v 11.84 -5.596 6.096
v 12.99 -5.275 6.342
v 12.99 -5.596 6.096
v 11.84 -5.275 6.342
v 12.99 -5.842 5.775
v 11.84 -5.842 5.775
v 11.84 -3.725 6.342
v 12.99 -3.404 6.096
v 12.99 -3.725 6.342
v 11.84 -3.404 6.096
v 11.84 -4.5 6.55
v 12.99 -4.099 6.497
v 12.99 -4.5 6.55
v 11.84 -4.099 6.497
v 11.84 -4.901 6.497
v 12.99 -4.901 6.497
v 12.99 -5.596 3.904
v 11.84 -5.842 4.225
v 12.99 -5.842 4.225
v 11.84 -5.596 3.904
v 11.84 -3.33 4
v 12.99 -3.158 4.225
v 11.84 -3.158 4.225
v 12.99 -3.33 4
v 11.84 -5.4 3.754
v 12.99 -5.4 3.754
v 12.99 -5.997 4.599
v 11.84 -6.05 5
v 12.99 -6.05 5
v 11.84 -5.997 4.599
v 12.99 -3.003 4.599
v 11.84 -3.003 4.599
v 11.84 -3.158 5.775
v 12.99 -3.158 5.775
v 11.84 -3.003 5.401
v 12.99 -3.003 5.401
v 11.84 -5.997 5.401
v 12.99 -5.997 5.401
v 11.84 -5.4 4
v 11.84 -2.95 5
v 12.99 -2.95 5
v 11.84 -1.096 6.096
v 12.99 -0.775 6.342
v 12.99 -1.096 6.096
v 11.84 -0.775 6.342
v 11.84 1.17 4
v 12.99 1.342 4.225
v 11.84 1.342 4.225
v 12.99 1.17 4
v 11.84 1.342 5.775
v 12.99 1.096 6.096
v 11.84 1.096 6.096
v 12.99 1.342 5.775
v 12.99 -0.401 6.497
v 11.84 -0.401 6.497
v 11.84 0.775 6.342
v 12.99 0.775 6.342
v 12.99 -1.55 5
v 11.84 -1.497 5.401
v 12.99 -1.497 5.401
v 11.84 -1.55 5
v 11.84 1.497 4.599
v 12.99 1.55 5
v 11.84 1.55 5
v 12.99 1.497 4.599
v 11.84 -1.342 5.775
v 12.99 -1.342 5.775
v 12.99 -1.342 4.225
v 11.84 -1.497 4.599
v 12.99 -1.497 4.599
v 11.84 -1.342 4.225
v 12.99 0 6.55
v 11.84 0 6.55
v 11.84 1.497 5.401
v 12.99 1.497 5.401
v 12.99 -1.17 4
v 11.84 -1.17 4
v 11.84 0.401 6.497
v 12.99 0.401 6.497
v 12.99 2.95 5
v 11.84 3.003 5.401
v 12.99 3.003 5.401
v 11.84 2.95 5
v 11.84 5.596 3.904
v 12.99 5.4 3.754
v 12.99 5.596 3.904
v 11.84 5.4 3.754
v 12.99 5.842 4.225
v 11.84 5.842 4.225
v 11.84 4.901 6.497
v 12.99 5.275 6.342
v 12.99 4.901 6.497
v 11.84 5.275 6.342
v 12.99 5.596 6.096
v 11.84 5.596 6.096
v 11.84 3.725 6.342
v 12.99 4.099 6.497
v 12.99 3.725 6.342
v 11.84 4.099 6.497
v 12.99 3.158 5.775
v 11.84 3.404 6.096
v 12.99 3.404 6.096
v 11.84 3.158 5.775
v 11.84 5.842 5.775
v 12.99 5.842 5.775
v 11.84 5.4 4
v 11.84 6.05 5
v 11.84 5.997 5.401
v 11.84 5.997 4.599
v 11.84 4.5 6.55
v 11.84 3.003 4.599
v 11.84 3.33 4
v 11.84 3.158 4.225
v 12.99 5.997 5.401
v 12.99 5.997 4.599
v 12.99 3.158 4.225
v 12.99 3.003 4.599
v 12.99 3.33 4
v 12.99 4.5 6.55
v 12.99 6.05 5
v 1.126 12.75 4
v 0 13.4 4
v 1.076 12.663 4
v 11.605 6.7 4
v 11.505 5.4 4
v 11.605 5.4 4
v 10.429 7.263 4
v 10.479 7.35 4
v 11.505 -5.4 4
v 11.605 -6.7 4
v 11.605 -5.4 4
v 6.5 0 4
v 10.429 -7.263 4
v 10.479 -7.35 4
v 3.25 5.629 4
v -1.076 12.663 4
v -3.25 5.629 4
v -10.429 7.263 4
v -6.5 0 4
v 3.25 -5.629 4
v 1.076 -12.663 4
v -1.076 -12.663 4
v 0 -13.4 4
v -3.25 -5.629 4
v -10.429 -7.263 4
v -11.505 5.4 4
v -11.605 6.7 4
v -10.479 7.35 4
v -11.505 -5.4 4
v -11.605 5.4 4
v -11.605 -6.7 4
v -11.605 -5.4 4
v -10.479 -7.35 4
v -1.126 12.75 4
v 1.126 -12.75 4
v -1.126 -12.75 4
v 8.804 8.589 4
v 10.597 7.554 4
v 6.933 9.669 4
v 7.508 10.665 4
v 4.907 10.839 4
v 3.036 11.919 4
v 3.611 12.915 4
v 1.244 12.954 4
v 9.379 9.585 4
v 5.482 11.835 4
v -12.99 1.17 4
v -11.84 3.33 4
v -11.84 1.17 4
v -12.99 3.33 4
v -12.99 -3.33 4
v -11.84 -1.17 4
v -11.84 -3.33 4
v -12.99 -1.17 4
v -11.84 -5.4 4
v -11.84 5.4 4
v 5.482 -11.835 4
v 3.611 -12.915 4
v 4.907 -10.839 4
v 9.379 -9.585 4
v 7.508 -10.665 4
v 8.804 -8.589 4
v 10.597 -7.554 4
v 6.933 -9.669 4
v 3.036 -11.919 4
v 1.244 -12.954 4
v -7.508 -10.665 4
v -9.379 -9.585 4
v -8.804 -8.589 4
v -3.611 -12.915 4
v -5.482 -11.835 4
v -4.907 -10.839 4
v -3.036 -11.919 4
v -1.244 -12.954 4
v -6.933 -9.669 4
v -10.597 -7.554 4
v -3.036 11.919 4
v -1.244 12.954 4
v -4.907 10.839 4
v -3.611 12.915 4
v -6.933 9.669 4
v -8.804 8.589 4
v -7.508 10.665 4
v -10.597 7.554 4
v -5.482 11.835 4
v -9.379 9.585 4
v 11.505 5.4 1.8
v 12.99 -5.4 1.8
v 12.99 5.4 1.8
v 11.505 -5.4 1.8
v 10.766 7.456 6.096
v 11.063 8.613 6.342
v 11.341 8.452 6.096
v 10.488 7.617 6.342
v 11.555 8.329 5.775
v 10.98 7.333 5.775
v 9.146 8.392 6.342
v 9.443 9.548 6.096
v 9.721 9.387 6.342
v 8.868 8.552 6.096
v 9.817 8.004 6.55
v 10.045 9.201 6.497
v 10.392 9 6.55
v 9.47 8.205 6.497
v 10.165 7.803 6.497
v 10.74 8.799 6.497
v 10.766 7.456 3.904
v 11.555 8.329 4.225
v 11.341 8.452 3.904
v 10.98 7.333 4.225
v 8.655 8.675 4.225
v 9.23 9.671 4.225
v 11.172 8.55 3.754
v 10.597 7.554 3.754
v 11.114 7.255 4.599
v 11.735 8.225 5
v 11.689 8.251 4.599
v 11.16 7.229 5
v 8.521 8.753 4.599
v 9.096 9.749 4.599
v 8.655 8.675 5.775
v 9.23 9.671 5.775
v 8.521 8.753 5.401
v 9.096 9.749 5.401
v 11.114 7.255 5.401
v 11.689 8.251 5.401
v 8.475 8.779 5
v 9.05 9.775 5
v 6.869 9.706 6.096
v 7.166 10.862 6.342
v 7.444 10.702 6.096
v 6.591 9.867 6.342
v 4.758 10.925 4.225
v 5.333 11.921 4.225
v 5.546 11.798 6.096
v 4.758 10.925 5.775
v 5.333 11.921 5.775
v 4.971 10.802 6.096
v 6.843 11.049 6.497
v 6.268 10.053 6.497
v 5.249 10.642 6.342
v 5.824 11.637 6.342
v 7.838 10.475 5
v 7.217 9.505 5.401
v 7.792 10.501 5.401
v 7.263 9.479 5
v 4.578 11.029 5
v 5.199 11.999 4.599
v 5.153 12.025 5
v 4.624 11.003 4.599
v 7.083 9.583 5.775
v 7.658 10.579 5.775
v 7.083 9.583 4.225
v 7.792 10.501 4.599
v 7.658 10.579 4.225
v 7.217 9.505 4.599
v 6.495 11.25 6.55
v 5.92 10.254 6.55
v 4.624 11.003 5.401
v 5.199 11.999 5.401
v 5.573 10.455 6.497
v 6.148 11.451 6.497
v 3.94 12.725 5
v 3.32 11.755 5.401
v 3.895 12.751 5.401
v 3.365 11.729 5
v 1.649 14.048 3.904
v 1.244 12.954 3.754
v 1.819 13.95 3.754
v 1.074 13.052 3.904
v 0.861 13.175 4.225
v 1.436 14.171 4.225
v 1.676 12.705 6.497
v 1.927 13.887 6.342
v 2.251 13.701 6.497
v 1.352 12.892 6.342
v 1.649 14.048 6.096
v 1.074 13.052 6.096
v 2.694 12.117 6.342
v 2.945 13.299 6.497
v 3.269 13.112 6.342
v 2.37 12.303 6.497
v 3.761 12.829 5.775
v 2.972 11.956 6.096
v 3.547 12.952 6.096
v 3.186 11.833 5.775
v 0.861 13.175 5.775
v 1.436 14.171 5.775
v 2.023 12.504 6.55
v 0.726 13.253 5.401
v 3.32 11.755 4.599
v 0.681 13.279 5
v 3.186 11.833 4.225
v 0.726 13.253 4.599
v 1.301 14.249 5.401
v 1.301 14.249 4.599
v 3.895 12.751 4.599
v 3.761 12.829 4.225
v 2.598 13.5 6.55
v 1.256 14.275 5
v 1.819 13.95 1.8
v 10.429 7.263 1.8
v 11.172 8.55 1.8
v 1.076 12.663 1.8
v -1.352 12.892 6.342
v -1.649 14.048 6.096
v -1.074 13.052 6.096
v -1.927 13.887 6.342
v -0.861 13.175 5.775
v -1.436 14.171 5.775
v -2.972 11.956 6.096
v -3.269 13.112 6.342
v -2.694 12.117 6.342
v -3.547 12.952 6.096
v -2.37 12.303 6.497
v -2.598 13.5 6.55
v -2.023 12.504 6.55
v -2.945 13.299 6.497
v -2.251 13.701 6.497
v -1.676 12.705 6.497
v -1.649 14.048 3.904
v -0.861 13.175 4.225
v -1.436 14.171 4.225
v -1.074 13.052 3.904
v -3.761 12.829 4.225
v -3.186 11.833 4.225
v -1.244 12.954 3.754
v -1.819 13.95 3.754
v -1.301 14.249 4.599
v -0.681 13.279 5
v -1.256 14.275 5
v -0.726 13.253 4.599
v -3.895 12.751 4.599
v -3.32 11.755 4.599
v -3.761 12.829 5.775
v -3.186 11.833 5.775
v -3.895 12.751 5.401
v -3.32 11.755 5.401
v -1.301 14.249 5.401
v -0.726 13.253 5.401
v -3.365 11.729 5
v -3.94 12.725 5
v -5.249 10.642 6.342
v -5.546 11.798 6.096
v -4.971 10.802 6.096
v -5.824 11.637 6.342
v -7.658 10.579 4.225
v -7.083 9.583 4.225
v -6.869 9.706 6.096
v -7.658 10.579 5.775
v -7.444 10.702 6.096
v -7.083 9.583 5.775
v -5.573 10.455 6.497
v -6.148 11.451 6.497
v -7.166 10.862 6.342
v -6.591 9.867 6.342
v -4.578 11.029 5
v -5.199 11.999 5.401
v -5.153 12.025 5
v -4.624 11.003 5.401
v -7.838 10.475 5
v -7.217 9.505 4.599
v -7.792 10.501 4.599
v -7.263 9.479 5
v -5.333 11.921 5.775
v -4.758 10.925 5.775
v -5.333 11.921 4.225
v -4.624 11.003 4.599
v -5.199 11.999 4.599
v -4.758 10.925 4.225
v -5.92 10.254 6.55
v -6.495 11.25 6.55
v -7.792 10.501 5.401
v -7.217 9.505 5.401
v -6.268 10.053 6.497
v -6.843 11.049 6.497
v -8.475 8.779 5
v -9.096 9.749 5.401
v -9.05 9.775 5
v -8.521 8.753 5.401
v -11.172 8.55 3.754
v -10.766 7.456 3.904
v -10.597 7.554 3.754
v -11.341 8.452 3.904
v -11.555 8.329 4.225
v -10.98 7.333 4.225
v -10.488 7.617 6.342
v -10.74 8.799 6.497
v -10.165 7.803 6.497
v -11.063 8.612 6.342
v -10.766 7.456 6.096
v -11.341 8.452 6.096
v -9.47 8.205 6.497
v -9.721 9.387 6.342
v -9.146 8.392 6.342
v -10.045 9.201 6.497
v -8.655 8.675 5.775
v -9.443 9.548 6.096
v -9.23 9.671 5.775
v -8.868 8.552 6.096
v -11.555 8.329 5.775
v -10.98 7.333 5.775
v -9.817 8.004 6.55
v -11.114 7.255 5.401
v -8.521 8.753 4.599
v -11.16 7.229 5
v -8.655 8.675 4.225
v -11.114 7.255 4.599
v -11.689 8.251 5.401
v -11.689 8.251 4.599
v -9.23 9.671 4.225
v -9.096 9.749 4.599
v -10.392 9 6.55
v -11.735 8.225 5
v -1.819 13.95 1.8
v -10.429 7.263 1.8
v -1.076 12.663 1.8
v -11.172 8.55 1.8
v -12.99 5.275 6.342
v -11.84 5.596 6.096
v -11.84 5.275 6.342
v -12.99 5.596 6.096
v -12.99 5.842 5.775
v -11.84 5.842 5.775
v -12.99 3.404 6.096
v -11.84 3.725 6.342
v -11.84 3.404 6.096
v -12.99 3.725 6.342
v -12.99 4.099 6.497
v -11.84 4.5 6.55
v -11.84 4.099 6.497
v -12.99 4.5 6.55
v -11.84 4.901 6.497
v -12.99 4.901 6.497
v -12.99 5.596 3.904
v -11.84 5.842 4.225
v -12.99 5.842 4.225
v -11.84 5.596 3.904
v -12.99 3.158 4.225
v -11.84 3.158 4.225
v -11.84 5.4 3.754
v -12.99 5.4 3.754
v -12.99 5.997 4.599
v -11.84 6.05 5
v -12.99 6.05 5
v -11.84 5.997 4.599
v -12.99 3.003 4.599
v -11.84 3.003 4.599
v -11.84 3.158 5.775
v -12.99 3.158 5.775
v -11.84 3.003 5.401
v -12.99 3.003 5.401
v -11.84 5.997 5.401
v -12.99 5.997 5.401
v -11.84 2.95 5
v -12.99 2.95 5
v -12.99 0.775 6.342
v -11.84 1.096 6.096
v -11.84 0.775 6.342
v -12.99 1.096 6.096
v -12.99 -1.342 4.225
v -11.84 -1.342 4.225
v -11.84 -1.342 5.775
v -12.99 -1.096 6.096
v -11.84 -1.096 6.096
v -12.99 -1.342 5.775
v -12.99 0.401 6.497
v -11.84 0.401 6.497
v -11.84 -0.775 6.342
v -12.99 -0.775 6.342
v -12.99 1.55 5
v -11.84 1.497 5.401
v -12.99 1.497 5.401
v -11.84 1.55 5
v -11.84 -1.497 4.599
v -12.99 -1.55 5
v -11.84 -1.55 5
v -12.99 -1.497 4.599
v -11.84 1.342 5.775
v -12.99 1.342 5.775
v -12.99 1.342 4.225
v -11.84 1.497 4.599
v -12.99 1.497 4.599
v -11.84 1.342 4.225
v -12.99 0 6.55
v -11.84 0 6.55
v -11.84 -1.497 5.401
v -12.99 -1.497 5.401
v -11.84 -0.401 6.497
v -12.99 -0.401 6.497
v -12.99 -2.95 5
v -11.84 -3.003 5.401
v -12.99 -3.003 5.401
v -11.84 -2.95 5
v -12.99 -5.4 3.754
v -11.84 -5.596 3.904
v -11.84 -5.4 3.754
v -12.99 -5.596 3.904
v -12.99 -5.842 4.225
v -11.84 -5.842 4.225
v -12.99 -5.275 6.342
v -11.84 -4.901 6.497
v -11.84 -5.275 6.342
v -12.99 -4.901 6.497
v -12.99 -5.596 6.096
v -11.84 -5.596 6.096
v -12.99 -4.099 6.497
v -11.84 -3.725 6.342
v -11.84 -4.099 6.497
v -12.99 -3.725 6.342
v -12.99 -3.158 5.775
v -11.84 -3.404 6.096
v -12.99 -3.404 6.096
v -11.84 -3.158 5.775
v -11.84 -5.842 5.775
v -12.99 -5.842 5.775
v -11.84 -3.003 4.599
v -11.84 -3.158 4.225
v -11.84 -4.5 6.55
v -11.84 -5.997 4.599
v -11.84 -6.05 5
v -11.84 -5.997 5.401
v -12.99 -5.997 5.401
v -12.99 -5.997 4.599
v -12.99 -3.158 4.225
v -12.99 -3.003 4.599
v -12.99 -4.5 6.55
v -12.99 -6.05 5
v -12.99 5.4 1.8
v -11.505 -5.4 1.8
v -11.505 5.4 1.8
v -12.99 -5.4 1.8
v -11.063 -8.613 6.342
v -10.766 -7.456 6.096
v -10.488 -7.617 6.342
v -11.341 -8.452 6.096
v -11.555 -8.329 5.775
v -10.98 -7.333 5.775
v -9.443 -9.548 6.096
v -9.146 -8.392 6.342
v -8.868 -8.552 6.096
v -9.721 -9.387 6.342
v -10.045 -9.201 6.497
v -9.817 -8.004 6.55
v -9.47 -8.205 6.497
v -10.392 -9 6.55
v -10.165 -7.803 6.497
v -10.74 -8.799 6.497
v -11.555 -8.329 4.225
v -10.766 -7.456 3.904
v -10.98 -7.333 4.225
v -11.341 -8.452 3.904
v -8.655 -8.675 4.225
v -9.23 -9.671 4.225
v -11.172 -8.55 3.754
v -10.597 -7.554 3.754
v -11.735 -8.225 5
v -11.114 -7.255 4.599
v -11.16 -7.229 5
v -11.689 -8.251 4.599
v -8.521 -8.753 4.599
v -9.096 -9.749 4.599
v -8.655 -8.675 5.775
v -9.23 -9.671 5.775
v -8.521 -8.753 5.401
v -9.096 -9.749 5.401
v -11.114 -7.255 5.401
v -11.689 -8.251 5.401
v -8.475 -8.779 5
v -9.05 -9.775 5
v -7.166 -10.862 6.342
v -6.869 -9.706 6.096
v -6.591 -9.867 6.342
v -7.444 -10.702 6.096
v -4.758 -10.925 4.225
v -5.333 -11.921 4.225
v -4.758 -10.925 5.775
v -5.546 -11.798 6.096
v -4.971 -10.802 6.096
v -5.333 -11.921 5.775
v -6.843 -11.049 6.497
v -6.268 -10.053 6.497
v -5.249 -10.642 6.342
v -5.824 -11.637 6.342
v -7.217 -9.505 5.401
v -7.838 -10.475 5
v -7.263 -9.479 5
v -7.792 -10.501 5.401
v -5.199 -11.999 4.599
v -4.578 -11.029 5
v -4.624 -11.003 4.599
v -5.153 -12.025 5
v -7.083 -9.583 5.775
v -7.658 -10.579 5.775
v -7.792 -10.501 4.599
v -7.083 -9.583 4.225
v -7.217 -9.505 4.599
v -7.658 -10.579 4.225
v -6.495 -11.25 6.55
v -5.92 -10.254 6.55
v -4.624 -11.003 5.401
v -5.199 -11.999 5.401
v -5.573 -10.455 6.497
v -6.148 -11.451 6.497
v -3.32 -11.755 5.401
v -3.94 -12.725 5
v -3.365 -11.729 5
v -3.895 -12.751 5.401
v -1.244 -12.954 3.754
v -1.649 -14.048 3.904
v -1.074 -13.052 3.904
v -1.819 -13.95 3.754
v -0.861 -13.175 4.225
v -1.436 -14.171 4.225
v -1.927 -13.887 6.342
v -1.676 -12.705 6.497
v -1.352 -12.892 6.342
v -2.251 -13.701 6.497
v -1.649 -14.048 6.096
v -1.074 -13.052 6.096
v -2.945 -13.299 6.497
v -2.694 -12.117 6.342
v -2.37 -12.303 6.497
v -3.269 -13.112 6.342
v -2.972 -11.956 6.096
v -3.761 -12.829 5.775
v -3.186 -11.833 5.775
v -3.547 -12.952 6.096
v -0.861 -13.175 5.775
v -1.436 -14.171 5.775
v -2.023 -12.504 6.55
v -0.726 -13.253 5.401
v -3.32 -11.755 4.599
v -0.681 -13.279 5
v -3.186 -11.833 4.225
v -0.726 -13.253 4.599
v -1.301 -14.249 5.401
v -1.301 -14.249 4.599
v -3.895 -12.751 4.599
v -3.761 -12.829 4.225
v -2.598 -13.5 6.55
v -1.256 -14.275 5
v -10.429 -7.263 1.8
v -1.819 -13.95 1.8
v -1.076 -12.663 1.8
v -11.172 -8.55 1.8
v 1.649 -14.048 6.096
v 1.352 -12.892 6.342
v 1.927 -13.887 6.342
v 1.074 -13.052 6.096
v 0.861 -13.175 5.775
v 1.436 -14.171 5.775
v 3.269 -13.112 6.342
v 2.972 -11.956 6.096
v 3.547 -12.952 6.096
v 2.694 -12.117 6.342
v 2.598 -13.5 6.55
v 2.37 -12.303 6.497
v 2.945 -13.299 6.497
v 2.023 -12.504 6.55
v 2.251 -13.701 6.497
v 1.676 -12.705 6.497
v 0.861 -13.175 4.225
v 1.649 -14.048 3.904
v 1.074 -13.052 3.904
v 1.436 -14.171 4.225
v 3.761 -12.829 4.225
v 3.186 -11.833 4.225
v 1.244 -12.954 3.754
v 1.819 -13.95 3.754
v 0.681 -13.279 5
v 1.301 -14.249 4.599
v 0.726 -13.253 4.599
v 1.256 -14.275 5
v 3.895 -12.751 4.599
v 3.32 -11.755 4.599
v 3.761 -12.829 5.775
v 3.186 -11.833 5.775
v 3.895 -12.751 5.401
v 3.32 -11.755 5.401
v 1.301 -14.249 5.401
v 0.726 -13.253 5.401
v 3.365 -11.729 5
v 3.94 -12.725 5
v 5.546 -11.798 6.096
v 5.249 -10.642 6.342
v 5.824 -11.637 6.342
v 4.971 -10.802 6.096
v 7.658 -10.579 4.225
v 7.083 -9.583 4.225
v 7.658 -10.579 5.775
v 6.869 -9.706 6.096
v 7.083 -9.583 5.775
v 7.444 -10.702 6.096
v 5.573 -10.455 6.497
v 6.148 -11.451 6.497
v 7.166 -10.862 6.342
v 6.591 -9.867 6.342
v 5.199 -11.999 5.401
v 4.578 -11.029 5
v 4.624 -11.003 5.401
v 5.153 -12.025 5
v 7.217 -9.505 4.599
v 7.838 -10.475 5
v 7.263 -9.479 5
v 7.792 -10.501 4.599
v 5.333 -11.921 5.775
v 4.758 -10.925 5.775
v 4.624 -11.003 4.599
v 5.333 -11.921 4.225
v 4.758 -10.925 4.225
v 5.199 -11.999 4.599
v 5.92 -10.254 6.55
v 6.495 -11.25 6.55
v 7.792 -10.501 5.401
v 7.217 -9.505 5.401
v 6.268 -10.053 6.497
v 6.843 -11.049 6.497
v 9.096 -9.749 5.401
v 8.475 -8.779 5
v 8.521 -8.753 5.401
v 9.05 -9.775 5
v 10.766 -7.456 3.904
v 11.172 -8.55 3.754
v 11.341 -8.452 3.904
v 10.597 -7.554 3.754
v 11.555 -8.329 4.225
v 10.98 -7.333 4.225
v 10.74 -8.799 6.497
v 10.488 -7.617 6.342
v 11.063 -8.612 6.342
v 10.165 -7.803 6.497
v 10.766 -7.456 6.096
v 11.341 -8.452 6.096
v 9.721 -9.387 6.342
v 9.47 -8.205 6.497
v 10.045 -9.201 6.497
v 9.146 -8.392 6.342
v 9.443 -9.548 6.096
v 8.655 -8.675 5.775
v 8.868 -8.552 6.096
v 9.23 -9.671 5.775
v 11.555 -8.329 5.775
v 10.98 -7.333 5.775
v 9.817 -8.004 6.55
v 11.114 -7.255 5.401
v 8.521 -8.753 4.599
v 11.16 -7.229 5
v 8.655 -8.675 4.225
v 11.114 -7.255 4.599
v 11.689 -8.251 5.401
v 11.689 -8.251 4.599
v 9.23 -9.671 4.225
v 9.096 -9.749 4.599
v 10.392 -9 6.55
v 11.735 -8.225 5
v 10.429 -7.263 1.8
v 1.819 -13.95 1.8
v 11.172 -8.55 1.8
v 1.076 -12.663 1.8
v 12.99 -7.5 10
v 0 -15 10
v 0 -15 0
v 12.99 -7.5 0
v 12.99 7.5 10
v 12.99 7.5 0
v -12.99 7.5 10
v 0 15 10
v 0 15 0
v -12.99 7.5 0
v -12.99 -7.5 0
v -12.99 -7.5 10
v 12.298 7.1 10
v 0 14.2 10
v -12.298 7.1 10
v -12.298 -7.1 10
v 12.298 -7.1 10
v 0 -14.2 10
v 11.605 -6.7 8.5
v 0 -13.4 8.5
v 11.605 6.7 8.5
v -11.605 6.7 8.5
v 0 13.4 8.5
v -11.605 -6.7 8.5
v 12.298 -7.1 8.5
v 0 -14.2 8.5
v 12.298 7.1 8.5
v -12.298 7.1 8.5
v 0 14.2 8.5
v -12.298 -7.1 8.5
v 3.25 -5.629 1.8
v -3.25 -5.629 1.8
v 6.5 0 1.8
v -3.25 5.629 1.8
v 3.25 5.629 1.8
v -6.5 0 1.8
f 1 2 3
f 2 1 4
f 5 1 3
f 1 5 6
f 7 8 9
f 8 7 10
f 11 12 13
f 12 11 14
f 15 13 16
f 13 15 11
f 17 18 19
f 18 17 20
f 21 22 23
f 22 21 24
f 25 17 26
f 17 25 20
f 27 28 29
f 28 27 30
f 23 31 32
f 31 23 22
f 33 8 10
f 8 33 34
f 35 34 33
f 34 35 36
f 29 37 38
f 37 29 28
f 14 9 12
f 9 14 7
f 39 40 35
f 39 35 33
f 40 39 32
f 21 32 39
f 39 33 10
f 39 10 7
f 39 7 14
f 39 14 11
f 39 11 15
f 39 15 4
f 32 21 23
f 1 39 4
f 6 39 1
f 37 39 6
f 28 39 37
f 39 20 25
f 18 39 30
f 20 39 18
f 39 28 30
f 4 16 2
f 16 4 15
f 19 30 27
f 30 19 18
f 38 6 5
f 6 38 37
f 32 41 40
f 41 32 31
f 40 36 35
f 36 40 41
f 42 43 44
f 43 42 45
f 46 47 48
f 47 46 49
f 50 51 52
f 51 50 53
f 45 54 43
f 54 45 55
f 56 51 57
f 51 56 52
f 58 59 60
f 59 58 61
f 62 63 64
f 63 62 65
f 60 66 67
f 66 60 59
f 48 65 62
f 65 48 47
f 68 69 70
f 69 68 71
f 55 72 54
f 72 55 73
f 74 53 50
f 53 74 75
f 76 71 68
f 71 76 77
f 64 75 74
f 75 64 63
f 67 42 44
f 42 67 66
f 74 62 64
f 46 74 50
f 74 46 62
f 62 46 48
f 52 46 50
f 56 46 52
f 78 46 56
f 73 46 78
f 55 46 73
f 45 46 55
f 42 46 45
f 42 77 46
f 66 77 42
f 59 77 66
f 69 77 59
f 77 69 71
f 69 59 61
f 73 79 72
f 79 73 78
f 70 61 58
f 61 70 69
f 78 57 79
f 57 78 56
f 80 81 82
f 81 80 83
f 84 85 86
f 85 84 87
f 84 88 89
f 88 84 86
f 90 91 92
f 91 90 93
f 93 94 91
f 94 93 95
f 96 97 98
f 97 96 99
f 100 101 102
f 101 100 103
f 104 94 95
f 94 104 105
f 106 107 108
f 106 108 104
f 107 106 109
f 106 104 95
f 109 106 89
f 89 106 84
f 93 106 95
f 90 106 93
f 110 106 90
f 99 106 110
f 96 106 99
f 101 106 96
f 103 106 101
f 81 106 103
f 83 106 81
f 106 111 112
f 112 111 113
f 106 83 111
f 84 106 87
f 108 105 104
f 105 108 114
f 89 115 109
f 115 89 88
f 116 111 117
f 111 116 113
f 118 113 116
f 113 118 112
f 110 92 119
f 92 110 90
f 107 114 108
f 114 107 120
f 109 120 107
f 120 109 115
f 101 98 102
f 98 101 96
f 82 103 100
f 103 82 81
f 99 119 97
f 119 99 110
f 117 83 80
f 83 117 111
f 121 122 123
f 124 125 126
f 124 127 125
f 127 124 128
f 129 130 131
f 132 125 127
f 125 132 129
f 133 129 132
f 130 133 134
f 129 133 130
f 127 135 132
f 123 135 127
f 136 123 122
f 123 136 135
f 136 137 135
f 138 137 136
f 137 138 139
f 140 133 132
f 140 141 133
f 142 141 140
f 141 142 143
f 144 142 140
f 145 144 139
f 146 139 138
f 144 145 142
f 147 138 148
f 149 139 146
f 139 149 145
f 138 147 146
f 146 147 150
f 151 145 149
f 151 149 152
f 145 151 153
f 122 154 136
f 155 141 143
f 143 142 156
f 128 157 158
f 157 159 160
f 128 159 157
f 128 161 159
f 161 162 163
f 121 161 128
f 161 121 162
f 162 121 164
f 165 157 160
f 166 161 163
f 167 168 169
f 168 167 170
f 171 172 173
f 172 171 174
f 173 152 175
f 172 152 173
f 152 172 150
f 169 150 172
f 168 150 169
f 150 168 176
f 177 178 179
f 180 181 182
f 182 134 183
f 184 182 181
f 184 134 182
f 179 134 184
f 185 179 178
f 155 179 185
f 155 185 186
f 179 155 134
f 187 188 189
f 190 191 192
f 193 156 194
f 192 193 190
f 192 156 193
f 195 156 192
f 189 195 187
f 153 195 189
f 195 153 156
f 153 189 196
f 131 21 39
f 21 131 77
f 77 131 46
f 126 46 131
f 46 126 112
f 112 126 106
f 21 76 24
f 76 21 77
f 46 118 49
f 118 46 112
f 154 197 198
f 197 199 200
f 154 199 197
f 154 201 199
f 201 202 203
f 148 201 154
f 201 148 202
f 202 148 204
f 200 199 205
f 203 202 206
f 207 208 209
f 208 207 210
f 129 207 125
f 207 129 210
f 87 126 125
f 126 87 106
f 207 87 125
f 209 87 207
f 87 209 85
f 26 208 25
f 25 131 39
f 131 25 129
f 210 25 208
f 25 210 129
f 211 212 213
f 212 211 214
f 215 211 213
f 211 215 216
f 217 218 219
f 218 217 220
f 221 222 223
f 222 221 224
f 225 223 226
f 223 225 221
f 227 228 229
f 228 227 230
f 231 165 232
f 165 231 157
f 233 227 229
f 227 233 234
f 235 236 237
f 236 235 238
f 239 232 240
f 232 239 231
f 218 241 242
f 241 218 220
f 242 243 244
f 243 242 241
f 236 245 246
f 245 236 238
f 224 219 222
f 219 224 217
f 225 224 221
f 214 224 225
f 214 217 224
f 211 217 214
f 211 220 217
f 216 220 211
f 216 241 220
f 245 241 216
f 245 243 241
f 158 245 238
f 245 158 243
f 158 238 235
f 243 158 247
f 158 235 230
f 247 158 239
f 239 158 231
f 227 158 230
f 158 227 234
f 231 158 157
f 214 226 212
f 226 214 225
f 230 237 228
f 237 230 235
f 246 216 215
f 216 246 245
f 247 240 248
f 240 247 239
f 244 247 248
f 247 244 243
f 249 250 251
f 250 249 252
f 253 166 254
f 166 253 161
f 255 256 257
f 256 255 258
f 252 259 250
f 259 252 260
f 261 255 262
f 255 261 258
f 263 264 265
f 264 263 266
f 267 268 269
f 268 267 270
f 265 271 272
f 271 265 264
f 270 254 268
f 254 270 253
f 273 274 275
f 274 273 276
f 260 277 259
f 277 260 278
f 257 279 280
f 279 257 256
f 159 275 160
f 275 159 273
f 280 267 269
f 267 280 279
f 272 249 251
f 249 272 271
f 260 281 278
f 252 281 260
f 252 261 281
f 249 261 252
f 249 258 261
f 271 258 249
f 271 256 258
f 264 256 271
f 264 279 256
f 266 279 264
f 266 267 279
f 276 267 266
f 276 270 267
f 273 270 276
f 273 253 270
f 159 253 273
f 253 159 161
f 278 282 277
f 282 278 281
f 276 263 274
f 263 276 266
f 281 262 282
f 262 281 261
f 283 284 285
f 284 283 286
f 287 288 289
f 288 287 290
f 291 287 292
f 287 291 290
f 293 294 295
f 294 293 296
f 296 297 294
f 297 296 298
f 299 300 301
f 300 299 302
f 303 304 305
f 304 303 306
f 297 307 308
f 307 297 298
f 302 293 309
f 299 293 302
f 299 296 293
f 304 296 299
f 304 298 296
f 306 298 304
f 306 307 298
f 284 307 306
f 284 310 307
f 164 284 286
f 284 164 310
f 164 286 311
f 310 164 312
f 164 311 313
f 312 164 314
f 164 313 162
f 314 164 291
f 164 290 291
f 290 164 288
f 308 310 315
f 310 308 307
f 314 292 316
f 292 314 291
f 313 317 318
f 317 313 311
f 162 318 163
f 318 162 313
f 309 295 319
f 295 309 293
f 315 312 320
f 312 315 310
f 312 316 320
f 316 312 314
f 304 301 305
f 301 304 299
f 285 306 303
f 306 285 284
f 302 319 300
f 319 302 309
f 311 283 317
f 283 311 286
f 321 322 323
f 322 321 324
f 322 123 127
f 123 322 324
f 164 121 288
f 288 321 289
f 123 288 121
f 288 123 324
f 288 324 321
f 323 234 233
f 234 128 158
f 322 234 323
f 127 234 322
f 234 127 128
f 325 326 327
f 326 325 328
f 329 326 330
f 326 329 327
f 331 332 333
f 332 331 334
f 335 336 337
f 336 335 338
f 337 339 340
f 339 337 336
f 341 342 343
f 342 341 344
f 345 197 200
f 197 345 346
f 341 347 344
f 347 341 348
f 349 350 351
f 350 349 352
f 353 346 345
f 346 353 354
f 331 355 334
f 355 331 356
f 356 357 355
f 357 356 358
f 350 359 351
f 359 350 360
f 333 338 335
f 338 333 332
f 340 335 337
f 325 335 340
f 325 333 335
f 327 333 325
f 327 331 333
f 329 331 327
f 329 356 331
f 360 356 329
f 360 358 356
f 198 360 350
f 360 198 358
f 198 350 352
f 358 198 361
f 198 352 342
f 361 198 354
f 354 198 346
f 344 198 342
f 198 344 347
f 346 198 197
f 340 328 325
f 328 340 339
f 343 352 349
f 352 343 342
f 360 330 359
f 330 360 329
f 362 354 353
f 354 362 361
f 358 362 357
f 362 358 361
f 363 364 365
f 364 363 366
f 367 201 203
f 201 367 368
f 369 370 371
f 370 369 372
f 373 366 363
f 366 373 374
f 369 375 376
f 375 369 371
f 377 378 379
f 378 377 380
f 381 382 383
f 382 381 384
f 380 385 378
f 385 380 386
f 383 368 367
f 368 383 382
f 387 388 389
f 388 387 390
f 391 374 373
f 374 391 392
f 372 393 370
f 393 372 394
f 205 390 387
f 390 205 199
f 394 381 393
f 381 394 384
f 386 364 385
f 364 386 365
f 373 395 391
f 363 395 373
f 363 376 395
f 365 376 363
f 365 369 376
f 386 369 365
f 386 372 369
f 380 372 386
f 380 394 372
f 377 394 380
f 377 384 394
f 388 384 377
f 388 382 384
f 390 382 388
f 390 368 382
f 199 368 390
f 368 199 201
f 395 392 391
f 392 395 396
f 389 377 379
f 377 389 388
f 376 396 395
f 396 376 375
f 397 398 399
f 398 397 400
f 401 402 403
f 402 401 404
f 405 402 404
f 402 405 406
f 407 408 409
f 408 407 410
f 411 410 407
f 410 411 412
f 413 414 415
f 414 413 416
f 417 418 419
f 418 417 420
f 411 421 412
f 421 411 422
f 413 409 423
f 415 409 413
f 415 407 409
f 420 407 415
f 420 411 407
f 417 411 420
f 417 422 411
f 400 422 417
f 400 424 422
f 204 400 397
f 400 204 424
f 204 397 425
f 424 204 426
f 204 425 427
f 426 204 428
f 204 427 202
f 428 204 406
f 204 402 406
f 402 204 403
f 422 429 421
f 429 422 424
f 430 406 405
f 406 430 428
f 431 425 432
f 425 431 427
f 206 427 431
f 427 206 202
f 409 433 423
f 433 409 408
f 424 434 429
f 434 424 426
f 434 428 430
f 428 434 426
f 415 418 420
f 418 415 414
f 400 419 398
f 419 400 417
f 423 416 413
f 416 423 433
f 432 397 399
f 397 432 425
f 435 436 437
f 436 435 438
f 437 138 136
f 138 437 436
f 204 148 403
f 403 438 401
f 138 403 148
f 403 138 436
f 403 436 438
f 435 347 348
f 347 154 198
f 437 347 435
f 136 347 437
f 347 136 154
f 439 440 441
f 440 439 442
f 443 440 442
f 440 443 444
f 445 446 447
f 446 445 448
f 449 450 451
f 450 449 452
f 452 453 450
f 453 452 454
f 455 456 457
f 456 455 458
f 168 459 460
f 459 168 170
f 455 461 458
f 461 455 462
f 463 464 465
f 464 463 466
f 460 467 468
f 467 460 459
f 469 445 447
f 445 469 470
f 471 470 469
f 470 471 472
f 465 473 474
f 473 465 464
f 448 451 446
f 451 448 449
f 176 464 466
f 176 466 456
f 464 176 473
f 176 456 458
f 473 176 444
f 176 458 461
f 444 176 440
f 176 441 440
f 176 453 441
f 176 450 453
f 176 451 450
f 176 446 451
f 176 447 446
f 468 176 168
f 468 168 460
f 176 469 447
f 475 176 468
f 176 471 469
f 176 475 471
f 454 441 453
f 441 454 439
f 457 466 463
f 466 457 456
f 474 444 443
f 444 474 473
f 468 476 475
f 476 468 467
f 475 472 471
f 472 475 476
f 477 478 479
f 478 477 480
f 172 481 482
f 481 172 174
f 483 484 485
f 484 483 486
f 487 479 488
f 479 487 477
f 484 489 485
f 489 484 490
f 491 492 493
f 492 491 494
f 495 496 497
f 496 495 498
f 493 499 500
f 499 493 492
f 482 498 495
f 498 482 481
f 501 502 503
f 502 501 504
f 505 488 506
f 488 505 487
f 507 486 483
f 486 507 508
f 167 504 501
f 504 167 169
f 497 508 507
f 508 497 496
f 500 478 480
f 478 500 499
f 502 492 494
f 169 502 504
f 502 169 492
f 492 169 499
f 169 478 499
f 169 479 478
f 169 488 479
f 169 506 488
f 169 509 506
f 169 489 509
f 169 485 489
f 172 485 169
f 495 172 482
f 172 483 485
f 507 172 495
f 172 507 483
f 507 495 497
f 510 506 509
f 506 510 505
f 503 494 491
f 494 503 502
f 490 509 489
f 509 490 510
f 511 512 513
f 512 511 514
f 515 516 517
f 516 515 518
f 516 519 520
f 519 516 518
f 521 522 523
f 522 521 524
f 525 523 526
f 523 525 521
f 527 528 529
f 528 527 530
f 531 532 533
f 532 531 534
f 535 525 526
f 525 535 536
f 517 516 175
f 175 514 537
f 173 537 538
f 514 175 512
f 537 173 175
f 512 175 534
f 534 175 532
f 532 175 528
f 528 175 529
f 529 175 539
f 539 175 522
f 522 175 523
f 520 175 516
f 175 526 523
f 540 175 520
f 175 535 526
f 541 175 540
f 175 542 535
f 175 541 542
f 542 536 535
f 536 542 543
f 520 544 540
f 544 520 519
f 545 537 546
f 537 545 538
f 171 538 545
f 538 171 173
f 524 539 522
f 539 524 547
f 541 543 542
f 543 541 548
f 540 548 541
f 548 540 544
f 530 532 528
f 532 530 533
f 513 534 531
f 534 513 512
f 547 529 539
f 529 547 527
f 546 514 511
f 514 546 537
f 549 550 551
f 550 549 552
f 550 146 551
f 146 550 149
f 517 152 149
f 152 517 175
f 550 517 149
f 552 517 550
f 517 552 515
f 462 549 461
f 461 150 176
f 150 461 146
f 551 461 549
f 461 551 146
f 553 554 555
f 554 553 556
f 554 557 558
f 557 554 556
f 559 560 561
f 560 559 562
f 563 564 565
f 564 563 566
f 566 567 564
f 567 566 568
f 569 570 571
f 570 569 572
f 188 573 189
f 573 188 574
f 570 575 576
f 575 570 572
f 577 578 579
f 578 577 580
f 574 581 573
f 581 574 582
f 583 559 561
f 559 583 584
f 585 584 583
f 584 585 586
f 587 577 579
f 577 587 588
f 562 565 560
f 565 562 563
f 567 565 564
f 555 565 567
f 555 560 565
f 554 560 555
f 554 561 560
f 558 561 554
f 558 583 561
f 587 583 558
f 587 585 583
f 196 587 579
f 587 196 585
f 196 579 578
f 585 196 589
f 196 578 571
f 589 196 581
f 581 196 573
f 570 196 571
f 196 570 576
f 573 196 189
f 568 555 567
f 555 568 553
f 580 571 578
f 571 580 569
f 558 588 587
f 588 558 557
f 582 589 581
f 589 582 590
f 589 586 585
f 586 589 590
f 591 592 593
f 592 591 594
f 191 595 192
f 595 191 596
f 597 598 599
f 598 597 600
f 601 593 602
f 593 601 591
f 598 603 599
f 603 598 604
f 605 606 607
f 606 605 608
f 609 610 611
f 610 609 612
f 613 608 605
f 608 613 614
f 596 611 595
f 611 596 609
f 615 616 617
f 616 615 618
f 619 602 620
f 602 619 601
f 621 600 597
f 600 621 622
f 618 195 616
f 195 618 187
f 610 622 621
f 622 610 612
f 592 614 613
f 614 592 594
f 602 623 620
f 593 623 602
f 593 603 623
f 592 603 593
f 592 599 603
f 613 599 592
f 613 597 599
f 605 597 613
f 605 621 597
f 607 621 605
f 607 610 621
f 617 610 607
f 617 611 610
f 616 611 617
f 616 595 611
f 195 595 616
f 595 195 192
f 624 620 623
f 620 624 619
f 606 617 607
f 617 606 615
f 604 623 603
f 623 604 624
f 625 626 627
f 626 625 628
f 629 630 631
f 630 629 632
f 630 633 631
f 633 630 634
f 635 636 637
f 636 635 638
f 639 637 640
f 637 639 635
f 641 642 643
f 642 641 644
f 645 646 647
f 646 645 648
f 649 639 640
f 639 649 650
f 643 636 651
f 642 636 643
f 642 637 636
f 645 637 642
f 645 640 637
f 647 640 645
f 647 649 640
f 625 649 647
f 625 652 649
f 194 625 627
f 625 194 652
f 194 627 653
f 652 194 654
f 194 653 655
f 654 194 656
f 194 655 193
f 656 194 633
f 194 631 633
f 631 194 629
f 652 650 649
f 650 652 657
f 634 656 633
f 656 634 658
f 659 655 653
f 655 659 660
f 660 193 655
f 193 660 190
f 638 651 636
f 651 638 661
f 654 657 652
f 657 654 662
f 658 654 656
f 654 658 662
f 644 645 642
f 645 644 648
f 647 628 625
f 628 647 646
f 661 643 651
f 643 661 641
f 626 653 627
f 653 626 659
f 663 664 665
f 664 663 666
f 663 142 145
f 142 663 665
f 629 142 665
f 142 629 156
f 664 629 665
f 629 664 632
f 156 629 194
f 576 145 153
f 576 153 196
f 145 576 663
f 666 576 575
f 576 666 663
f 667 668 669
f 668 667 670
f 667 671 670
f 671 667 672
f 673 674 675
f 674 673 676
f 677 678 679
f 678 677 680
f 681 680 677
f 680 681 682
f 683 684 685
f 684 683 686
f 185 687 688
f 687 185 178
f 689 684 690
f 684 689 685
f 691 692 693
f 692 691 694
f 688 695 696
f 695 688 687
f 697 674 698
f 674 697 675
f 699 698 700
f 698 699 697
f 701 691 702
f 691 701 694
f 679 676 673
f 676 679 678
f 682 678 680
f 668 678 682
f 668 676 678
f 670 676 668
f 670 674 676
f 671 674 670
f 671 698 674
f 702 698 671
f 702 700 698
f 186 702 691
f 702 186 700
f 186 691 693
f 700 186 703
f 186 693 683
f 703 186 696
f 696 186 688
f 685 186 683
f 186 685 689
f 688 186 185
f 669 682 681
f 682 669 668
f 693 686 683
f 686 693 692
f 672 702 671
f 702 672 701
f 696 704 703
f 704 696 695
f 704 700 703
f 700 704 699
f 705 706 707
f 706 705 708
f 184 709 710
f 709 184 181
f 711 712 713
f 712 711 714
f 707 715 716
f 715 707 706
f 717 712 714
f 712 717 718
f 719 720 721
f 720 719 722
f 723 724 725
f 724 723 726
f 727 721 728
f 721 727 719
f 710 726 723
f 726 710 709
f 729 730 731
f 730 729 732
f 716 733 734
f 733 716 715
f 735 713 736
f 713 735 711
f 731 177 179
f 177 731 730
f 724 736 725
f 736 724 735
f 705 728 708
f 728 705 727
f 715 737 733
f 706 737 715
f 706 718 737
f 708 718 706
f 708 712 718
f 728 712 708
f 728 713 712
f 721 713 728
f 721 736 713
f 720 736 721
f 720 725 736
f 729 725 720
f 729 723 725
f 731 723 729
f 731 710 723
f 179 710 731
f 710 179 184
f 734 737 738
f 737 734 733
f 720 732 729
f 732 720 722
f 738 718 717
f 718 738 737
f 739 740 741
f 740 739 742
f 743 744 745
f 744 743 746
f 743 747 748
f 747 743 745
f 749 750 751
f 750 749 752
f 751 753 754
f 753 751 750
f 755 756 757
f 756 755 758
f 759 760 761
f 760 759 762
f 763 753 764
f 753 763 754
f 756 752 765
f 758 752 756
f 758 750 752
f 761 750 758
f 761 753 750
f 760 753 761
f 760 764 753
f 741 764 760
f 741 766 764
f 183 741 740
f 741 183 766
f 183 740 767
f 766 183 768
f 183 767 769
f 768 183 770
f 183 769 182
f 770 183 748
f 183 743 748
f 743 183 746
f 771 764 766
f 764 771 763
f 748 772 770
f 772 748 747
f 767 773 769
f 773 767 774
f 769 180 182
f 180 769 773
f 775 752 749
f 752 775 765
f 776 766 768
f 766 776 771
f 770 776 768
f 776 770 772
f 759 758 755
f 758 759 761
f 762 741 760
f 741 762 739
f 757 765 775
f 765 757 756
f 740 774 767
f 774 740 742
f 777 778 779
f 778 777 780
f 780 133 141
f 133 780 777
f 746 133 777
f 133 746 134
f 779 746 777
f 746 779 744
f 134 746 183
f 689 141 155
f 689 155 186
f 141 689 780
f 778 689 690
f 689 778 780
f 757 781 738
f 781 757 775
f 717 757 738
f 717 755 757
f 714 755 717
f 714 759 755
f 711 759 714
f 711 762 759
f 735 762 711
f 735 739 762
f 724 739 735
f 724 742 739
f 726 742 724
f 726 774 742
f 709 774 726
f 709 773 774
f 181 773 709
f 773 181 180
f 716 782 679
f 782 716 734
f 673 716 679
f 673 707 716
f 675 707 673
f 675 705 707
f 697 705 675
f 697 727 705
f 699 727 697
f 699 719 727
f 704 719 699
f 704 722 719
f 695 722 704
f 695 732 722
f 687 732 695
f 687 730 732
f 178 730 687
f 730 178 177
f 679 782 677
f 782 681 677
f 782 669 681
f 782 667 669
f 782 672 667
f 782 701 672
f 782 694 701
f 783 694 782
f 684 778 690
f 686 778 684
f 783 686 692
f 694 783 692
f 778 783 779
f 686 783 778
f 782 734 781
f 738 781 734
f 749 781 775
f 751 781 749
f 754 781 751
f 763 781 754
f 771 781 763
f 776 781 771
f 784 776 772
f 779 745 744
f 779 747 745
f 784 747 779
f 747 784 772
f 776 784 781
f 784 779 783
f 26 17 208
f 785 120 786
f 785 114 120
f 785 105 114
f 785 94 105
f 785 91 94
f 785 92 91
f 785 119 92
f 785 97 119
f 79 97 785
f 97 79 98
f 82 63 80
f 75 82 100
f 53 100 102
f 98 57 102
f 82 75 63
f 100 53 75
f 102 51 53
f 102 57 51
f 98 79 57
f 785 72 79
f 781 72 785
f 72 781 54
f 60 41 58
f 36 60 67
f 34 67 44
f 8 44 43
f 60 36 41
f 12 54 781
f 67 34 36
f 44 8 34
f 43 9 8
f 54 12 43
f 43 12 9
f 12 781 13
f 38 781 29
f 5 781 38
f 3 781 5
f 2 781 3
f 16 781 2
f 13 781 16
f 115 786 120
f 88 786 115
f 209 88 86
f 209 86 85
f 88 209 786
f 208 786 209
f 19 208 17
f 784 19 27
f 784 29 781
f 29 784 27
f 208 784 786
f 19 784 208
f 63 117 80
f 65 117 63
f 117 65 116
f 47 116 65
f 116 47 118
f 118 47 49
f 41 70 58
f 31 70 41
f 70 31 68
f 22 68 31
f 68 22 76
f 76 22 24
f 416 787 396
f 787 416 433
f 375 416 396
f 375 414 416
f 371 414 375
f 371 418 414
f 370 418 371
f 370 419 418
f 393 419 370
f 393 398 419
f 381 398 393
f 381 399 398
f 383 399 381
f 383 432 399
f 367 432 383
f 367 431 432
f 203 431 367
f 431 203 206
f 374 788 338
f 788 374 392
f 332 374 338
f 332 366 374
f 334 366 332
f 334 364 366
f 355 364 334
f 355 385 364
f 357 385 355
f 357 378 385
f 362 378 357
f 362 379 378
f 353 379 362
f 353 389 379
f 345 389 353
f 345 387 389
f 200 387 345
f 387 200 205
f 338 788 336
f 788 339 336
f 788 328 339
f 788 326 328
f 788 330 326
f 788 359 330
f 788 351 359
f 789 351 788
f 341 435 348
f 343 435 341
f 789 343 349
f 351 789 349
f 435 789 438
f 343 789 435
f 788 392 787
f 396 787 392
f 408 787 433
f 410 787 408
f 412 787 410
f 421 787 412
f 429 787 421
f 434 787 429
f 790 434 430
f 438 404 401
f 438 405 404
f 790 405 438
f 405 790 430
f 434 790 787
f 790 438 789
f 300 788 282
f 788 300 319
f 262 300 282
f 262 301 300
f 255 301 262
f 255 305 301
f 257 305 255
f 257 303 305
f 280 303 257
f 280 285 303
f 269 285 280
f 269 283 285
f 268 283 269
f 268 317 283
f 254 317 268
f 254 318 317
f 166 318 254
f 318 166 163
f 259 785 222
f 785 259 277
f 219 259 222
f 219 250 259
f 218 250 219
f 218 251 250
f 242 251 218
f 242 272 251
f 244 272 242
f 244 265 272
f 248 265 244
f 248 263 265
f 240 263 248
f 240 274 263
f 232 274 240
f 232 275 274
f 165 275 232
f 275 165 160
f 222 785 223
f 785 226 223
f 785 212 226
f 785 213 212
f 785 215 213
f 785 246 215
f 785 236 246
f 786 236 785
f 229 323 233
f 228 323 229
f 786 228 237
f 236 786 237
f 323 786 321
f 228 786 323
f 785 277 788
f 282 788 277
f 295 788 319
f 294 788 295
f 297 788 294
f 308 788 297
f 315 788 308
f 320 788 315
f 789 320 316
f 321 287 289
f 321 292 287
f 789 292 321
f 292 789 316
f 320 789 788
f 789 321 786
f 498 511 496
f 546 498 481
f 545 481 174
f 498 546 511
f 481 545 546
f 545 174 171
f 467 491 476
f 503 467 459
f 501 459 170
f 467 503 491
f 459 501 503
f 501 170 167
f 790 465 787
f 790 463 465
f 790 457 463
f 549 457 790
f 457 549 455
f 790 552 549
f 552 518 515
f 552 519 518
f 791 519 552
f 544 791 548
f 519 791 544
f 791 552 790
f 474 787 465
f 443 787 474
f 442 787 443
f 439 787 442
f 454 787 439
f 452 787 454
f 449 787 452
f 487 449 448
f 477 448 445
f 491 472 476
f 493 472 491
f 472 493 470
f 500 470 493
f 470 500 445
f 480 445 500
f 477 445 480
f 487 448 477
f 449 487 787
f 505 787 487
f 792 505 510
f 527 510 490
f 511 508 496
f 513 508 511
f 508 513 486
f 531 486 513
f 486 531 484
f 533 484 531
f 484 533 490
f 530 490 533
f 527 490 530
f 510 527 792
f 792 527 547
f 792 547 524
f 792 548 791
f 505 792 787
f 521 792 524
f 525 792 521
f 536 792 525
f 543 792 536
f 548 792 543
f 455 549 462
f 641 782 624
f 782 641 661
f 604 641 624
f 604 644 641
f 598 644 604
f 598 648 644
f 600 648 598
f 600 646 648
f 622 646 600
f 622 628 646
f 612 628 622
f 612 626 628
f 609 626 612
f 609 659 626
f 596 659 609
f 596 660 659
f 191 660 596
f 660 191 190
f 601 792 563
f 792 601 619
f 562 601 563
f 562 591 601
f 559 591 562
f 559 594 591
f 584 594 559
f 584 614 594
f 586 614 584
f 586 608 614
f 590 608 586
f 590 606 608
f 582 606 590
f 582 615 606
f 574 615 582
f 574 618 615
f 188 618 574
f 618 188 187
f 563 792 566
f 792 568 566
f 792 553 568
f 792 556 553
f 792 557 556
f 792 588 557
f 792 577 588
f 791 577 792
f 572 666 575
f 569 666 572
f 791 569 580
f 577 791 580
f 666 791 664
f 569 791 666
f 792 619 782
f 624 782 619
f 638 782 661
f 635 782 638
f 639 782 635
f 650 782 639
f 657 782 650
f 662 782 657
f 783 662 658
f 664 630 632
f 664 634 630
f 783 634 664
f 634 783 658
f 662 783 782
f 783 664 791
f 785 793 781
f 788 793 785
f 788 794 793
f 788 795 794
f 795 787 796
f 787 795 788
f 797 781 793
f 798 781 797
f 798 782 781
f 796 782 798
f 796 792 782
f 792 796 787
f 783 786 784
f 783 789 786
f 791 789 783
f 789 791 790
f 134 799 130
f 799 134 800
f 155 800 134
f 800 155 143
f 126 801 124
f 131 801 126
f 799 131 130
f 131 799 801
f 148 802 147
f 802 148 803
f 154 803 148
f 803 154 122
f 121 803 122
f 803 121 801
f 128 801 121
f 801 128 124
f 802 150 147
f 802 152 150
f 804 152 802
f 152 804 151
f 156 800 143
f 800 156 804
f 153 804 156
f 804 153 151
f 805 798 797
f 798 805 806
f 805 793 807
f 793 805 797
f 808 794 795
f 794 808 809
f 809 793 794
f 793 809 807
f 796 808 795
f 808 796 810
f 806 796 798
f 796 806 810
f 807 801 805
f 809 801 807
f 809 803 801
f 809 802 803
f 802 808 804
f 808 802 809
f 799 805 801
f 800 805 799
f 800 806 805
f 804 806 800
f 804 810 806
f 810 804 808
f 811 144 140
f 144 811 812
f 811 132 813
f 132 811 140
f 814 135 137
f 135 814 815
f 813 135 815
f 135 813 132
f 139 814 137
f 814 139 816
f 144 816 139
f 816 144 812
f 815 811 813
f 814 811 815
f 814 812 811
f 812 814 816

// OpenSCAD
// ==========================================================================
// Honeycomb Pixel — 3-Wire Magnetic Interconnect Single-Pixel Tile
// Parametric 3D OpenSCAD Model for WS2812B / SK6812 Single LED Modules
// Repository: https://github.com/gagansharma18/honeycomb_LED_pixel_ws2812b
// ==========================================================================

// --------------------------------------------------------------------------
// 1. PARAMETRIC USER DIMENSIONS (All values in millimeters)
// --------------------------------------------------------------------------
pixel_radius        = 15.00; // Outer radius of single hexagon tile (flat-to-flat = 25.98mm)
tile_height         = 10.00; // Total height of the base housing
wall_thickness      = 1.60;  // Uniform perimeter wall thickness
base_floor          = 1.80;  // Solid bottom base plate thickness
led_tray_height     = 4.00;  // Recessed bed tray height for LED PCB

// Magnetic Contact Specs (3 contacts per face: VCC, DATA, GND)
pogo_socket_dia     = 3.10;  // Socket diameter for 3mm magnets / pogo pins
pogo_socket_depth   = 2.20;  // Depth of socket pockets on perimeter faces
pogo_contact_pitch  = 4.50;  // Center-to-center distance between VCC, DATA, GND contacts

// Central LED Pocket & Diffuser Lid Specs
led_pocket_radius   = 6.50;  // Pocket radius for 5050 RGB LED / 12mm round star board
led_pocket_depth    = 2.20;  // Recessed pocket depth
diffuser_recess     = 1.50;  // Recessed top lip depth for snap-fit diffuser lid
diffuser_thickness  = 1.40;  // Thickness of translucent top diffuser cap
diffuser_clearance  = 0.20;  // Snap-fit clearance for 3D printing

// --------------------------------------------------------------------------
// 2. DERIVED GEOMETRY CALCULATIONS
// --------------------------------------------------------------------------
r_outer = pixel_radius;
r_inner = pixel_radius - wall_thickness;
a_outer = r_outer * sqrt(3)/2; // Apothem (distance to flat face)
a_inner = r_inner * sqrt(3)/2;

// --------------------------------------------------------------------------
// 3. SINGLE PIXEL BASE HOUSING MODULE
// --------------------------------------------------------------------------
module single_pixel_base() {
  difference() {
    // 1. Solid Outer Hexagon Body
    rotate([0, 0, 30])
      cylinder(r = r_outer, h = tile_height, $fn = 6);

    // 2. Main Light Chamber (Upper chamber above LED tray)
    translate([0, 0, led_tray_height])
      rotate([0, 0, 30])
        cylinder(r = r_inner, h = tile_height + 1, $fn = 6);

    // 3. Recessed Top Lip for Snap-Fit Diffuser Lid
    translate([0, 0, tile_height - diffuser_recess])
      rotate([0, 0, 30])
        cylinder(r = r_outer - wall_thickness/2, h = diffuser_recess + 0.1, $fn = 6);

    // 4. Central Pocket for WS2812B 5050 LED / PCB Board
    translate([0, 0, base_floor])
      cylinder(r = led_pocket_radius, h = led_tray_height - base_floor + 0.1, $fn = 6);

    // 5. 18 Magnetic Contact Sockets (3 sockets per face x 6 faces)
    for (angle = [0 : 60 : 300]) {
      rotate([0, 0, angle]) {
        // Outer face center is at x = a_outer
        translate([a_outer, 0, tile_height / 2]) {
          // Contact 1: VCC (+5V)
          translate([0, -pogo_contact_pitch, 0])
            rotate([0, 90, 0])
              cylinder(d = pogo_socket_dia, h = pogo_socket_depth + 0.1, center = true, $fn = 24);

          // Contact 2: DATA (Signal)
          translate([0, 0, 0])
            rotate([0, 90, 0])
              cylinder(d = pogo_socket_dia, h = pogo_socket_depth + 0.1, center = true, $fn = 24);

          // Contact 3: GND (Ground)
          translate([0, pogo_contact_pitch, 0])
            rotate([0, 90, 0])
              cylinder(d = pogo_socket_dia, h = pogo_socket_depth + 0.1, center = true, $fn = 24);
        }

        // Internal Wire Pass-Through Channels leading to Center LED Cavity
        translate([a_inner - 0.1, -pogo_contact_pitch * 1.2, base_floor])
          cube([wall_thickness + 0.2, pogo_contact_pitch * 2.4, led_tray_height - base_floor]);
      }
    }
  }
}

// --------------------------------------------------------------------------
// 4. TRANSLUCENT SNAP-FIT TOP DIFFUSER LID MODULE
// --------------------------------------------------------------------------
module diffuser_lid() {
  r_diff = (r_outer - wall_thickness/2) - diffuser_clearance;
  rotate([0, 0, 30])
    cylinder(r = r_diff, h = diffuser_thickness, $fn = 6);
}

// --------------------------------------------------------------------------
// 5. COMBINED ASSEMBLY PREVIEW
// --------------------------------------------------------------------------
module single_pixel_assembly(explode = false) {
  offset_z = explode ? 12 : 0;

  // Base Housing
  color([0.15, 0.20, 0.30, 1.0])
    single_pixel_base();

  // Simulated 5050 RGB LED PCB
  translate([0, 0, base_floor + 0.2])
    color([0.10, 0.70, 0.40, 1.0])
      cylinder(r = led_pocket_radius - 0.2, h = 1.60, $fn = 24);

  translate([0, 0, base_floor + 1.80])
    color([0.90, 0.90, 0.90, 1.0])
      cube([5.0, 5.0, 1.60], center = true);

  // Snap-Fit Top Diffuser Lid
  translate([0, 0, tile_height - diffuser_recess + offset_z])
    color([0.95, 0.95, 1.00, 0.75])
      diffuser_lid();
}

// Render Main Base Housing for STL Export
single_pixel_base();

// Uncomment to preview full exploded assembly in OpenSCAD:
// single_pixel_assembly(explode = true);
